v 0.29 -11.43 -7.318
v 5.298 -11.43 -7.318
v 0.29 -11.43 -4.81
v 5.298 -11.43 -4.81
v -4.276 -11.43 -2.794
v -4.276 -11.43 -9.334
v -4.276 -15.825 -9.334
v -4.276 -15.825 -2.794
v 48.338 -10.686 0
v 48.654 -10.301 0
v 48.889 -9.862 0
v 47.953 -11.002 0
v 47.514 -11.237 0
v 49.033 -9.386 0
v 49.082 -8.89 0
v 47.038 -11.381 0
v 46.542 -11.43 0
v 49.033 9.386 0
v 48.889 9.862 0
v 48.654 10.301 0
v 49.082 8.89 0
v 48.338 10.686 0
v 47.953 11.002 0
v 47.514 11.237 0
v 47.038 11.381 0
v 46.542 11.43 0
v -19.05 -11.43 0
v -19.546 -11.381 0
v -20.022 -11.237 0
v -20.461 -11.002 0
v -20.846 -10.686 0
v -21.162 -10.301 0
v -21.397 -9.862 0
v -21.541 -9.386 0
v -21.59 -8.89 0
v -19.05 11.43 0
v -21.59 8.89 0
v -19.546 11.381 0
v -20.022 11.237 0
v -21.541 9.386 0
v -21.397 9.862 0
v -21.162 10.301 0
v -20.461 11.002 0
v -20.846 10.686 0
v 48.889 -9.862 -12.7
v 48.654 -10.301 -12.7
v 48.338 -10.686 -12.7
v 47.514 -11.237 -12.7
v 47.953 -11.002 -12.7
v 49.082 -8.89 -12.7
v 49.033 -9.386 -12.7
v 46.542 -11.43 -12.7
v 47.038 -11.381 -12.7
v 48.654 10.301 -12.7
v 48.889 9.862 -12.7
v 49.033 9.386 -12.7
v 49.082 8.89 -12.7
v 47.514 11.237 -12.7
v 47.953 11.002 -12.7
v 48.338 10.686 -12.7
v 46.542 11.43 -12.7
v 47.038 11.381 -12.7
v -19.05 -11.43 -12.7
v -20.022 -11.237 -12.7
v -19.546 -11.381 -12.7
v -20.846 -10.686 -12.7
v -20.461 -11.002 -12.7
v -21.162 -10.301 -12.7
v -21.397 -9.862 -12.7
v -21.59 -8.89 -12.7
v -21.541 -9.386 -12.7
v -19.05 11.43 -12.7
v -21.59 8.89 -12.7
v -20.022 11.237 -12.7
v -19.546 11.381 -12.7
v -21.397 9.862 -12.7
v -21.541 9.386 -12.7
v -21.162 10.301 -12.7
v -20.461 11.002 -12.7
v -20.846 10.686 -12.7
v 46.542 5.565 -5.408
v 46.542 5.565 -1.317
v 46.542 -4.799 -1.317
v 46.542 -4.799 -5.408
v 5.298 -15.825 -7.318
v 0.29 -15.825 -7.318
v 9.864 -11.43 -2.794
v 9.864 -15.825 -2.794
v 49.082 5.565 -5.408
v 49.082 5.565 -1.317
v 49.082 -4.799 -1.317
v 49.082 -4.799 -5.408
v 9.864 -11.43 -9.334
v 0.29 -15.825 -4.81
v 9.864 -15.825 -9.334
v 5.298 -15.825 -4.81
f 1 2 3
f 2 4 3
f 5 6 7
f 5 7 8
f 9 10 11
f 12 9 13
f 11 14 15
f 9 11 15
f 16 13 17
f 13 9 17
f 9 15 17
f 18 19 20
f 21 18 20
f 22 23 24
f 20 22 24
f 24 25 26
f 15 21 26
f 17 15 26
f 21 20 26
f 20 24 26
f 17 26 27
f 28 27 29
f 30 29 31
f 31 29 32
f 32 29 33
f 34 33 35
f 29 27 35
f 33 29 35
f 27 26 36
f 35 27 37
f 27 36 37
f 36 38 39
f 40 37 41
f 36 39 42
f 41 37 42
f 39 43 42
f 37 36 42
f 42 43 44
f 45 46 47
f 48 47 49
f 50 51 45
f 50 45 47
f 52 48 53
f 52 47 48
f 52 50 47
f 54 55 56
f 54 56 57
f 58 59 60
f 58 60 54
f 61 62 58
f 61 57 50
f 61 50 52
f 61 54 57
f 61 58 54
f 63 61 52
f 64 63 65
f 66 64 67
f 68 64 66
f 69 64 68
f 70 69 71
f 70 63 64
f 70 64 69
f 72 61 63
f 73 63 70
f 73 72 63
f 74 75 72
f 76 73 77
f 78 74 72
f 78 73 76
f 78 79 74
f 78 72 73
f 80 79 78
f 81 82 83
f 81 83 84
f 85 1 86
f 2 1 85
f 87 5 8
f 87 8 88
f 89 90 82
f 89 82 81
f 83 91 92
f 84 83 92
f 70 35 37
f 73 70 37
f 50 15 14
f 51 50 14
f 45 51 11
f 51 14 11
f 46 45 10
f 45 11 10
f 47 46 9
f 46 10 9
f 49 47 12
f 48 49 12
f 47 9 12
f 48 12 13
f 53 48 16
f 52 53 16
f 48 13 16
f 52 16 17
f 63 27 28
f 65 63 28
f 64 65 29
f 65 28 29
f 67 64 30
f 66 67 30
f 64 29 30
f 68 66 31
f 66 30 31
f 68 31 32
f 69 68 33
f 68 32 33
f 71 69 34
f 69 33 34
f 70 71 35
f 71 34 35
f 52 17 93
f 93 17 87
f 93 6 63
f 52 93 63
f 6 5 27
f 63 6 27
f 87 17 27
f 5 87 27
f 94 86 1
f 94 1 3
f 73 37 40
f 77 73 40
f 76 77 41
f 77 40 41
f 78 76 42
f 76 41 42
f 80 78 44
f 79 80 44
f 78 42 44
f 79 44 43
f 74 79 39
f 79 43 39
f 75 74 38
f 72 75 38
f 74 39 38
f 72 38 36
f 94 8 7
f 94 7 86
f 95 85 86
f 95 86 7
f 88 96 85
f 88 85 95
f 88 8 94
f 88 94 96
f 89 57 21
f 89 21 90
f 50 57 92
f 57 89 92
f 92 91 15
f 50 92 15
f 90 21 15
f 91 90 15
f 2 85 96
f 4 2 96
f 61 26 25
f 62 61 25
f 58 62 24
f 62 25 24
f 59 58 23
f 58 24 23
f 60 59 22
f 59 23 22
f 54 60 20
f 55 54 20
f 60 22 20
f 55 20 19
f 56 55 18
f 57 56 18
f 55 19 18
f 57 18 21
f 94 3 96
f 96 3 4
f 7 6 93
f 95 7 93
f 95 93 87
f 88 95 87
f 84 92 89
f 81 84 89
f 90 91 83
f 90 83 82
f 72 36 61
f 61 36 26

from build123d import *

# Parameters (mm, degrees)
BOSS_EXTRUDE1_DEPTH = 12.7
SKETCH2_W           = 4.090641248
SKETCH2_H           = 10.364450922
CUT_EXTRUDE1_DEPTH  = 2.54
SKETCH3_W           = 14.14
SKETCH3_H           = 6.54
SKETCH3_W_2         = 5.008
SKETCH3_H_2         = 2.508
BOSS_EXTRUDE2_DEPTH = 4.39457265


with BuildPart() as part:
    # Sketch1 → Boss-Extrude1 (new body)
    with BuildSketch(Plane.XY):
        with BuildLine():
            Line((-19.05, 11.43), (46.542212097, 11.43))
            ThreePointArc((46.542212097, 11.43), (48.338263321, 10.686051224), (49.082212097, 8.89))
            Line((49.082212097, 8.89), (49.082212097, -8.89))
            ThreePointArc((49.082212097, -8.89), (48.338263321, -10.686051224), (46.542212097, -11.43))
            Line((46.542212097, -11.43), (-19.05, -11.43))
            ThreePointArc((-19.05, -11.43), (-20.846051224, -10.686051224), (-21.59, -8.89))
            Line((-21.59, -8.89), (-21.59, 8.89))
            ThreePointArc((-21.59, 8.89), (-20.846051224, 10.686051224), (-19.05, 11.43))
        make_face()
    extrude(amount=-BOSS_EXTRUDE1_DEPTH)

    # Sketch2 → Cut-Extrude1 (cut)
    with BuildSketch(Plane(origin=(49.082212097, 0, 0), x_dir=(0, 0, -1), z_dir=(1, 0, 0))):
        with Locations((3.362716068, 0.383061409)):
            Rectangle(SKETCH2_W, SKETCH2_H)
    extrude(amount=-CUT_EXTRUDE1_DEPTH, mode=Mode.SUBTRACT)

    # Sketch3 → Boss-Extrude2 (add)
    with BuildSketch(Plane.XZ.offset(11.43)):
        with Locations((2.794, -6.064)):
            Rectangle(SKETCH3_W, SKETCH3_H)
        with Locations((2.794, -6.064)):
            Rectangle(SKETCH3_W_2, SKETCH3_H_2, mode=Mode.SUBTRACT)
    extrude(amount=BOSS_EXTRUDE2_DEPTH)


solid = part.part
